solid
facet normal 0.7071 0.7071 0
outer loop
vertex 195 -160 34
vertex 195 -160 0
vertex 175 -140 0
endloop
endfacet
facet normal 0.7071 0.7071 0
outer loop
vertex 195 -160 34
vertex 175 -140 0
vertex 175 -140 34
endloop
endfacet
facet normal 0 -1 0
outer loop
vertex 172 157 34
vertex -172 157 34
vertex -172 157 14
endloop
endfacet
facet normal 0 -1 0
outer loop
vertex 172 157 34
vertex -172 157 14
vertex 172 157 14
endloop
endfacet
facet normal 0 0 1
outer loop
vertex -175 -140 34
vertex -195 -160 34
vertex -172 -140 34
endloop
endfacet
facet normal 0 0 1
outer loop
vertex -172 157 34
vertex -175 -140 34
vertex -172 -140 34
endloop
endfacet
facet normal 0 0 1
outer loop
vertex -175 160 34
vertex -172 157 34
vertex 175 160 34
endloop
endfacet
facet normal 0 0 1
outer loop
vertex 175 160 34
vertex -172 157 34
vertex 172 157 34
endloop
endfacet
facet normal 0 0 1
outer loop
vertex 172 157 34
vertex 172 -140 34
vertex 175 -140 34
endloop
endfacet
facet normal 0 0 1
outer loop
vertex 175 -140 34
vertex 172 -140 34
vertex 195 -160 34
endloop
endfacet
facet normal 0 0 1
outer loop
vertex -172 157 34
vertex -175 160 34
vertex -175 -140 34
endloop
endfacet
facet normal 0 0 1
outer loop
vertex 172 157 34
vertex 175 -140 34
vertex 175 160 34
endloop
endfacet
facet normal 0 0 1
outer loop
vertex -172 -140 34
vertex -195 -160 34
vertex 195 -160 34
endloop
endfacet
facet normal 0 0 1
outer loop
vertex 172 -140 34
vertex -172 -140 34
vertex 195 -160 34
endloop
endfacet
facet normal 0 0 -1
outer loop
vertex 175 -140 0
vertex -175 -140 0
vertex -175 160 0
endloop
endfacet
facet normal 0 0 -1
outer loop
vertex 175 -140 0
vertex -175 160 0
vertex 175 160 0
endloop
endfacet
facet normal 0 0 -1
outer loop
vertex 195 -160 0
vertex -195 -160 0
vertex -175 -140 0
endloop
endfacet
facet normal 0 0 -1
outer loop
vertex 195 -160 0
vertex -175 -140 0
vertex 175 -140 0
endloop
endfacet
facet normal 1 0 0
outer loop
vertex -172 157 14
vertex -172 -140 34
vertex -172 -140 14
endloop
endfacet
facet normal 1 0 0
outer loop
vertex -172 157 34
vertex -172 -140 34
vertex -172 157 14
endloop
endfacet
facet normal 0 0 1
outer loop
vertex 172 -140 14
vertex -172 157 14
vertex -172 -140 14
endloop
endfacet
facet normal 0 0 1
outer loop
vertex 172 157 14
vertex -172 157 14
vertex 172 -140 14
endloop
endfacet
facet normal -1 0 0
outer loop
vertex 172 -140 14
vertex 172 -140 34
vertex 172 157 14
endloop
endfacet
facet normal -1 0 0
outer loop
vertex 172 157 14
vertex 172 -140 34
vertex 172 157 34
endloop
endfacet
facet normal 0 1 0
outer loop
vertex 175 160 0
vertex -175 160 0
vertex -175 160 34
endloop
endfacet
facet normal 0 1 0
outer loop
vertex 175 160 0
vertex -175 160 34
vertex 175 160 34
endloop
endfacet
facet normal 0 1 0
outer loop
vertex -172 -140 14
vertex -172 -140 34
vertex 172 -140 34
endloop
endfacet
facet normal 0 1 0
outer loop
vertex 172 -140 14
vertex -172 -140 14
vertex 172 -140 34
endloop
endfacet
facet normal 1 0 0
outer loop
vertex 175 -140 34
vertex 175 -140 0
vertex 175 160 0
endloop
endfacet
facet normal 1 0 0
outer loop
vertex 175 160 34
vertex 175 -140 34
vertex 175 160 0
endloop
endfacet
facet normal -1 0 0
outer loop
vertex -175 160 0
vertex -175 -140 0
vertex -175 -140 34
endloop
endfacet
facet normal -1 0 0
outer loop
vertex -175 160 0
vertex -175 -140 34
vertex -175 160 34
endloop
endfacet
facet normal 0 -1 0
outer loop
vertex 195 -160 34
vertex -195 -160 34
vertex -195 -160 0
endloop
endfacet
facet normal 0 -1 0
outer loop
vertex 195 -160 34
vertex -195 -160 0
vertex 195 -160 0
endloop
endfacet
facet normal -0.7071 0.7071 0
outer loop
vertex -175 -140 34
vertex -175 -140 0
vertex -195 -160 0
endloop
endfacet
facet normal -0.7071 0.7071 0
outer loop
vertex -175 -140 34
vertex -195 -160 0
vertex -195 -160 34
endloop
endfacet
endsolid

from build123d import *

# Parameters (mm, degrees)
SKETCH_1_W          = 350
SKETCH_1_H          = 320
EXTRUDE_1_DEPTH     = 34
SKETCH_2_W          = 344
SKETCH_2_H          = 314
CUT_EXTRUDE_1_DEPTH = 20
SKETCH_3_W          = 390
SKETCH_3_H          = 34
EXTRUDE_2_DEPTH     = 20
CHAMFER_1_SIZE      = 20


with BuildPart() as part:
    # 草图1 → 凸台-拉伸1 (new body)
    with BuildSketch(Plane.XY):
        Rectangle(SKETCH_1_W, SKETCH_1_H)
    extrude(amount=EXTRUDE_1_DEPTH)

    # 草图2 → 切除-拉伸1 (cut)
    with BuildSketch(Plane.XY.offset(34)):
        Rectangle(SKETCH_2_W, SKETCH_2_H)
    extrude(amount=-CUT_EXTRUDE_1_DEPTH, mode=Mode.SUBTRACT)

    # 草图3 → 凸台-拉伸2 (add)
    with BuildSketch(Plane.XZ.offset(160)):
        with Locations((0, 17)):
            Rectangle(SKETCH_3_W, SKETCH_3_H)
    extrude(amount=-EXTRUDE_2_DEPTH)

    # 倒角1
    chamfer_1_edges = [part.edges().sort_by_distance(p)[0] for p in [
        (195, -140, 17),
        (-195, -140, 17),
    ]]
    chamfer(chamfer_1_edges, length=CHAMFER_1_SIZE - 0.0001)  # a hair under: the kernel refuses the full size


solid = part.part
